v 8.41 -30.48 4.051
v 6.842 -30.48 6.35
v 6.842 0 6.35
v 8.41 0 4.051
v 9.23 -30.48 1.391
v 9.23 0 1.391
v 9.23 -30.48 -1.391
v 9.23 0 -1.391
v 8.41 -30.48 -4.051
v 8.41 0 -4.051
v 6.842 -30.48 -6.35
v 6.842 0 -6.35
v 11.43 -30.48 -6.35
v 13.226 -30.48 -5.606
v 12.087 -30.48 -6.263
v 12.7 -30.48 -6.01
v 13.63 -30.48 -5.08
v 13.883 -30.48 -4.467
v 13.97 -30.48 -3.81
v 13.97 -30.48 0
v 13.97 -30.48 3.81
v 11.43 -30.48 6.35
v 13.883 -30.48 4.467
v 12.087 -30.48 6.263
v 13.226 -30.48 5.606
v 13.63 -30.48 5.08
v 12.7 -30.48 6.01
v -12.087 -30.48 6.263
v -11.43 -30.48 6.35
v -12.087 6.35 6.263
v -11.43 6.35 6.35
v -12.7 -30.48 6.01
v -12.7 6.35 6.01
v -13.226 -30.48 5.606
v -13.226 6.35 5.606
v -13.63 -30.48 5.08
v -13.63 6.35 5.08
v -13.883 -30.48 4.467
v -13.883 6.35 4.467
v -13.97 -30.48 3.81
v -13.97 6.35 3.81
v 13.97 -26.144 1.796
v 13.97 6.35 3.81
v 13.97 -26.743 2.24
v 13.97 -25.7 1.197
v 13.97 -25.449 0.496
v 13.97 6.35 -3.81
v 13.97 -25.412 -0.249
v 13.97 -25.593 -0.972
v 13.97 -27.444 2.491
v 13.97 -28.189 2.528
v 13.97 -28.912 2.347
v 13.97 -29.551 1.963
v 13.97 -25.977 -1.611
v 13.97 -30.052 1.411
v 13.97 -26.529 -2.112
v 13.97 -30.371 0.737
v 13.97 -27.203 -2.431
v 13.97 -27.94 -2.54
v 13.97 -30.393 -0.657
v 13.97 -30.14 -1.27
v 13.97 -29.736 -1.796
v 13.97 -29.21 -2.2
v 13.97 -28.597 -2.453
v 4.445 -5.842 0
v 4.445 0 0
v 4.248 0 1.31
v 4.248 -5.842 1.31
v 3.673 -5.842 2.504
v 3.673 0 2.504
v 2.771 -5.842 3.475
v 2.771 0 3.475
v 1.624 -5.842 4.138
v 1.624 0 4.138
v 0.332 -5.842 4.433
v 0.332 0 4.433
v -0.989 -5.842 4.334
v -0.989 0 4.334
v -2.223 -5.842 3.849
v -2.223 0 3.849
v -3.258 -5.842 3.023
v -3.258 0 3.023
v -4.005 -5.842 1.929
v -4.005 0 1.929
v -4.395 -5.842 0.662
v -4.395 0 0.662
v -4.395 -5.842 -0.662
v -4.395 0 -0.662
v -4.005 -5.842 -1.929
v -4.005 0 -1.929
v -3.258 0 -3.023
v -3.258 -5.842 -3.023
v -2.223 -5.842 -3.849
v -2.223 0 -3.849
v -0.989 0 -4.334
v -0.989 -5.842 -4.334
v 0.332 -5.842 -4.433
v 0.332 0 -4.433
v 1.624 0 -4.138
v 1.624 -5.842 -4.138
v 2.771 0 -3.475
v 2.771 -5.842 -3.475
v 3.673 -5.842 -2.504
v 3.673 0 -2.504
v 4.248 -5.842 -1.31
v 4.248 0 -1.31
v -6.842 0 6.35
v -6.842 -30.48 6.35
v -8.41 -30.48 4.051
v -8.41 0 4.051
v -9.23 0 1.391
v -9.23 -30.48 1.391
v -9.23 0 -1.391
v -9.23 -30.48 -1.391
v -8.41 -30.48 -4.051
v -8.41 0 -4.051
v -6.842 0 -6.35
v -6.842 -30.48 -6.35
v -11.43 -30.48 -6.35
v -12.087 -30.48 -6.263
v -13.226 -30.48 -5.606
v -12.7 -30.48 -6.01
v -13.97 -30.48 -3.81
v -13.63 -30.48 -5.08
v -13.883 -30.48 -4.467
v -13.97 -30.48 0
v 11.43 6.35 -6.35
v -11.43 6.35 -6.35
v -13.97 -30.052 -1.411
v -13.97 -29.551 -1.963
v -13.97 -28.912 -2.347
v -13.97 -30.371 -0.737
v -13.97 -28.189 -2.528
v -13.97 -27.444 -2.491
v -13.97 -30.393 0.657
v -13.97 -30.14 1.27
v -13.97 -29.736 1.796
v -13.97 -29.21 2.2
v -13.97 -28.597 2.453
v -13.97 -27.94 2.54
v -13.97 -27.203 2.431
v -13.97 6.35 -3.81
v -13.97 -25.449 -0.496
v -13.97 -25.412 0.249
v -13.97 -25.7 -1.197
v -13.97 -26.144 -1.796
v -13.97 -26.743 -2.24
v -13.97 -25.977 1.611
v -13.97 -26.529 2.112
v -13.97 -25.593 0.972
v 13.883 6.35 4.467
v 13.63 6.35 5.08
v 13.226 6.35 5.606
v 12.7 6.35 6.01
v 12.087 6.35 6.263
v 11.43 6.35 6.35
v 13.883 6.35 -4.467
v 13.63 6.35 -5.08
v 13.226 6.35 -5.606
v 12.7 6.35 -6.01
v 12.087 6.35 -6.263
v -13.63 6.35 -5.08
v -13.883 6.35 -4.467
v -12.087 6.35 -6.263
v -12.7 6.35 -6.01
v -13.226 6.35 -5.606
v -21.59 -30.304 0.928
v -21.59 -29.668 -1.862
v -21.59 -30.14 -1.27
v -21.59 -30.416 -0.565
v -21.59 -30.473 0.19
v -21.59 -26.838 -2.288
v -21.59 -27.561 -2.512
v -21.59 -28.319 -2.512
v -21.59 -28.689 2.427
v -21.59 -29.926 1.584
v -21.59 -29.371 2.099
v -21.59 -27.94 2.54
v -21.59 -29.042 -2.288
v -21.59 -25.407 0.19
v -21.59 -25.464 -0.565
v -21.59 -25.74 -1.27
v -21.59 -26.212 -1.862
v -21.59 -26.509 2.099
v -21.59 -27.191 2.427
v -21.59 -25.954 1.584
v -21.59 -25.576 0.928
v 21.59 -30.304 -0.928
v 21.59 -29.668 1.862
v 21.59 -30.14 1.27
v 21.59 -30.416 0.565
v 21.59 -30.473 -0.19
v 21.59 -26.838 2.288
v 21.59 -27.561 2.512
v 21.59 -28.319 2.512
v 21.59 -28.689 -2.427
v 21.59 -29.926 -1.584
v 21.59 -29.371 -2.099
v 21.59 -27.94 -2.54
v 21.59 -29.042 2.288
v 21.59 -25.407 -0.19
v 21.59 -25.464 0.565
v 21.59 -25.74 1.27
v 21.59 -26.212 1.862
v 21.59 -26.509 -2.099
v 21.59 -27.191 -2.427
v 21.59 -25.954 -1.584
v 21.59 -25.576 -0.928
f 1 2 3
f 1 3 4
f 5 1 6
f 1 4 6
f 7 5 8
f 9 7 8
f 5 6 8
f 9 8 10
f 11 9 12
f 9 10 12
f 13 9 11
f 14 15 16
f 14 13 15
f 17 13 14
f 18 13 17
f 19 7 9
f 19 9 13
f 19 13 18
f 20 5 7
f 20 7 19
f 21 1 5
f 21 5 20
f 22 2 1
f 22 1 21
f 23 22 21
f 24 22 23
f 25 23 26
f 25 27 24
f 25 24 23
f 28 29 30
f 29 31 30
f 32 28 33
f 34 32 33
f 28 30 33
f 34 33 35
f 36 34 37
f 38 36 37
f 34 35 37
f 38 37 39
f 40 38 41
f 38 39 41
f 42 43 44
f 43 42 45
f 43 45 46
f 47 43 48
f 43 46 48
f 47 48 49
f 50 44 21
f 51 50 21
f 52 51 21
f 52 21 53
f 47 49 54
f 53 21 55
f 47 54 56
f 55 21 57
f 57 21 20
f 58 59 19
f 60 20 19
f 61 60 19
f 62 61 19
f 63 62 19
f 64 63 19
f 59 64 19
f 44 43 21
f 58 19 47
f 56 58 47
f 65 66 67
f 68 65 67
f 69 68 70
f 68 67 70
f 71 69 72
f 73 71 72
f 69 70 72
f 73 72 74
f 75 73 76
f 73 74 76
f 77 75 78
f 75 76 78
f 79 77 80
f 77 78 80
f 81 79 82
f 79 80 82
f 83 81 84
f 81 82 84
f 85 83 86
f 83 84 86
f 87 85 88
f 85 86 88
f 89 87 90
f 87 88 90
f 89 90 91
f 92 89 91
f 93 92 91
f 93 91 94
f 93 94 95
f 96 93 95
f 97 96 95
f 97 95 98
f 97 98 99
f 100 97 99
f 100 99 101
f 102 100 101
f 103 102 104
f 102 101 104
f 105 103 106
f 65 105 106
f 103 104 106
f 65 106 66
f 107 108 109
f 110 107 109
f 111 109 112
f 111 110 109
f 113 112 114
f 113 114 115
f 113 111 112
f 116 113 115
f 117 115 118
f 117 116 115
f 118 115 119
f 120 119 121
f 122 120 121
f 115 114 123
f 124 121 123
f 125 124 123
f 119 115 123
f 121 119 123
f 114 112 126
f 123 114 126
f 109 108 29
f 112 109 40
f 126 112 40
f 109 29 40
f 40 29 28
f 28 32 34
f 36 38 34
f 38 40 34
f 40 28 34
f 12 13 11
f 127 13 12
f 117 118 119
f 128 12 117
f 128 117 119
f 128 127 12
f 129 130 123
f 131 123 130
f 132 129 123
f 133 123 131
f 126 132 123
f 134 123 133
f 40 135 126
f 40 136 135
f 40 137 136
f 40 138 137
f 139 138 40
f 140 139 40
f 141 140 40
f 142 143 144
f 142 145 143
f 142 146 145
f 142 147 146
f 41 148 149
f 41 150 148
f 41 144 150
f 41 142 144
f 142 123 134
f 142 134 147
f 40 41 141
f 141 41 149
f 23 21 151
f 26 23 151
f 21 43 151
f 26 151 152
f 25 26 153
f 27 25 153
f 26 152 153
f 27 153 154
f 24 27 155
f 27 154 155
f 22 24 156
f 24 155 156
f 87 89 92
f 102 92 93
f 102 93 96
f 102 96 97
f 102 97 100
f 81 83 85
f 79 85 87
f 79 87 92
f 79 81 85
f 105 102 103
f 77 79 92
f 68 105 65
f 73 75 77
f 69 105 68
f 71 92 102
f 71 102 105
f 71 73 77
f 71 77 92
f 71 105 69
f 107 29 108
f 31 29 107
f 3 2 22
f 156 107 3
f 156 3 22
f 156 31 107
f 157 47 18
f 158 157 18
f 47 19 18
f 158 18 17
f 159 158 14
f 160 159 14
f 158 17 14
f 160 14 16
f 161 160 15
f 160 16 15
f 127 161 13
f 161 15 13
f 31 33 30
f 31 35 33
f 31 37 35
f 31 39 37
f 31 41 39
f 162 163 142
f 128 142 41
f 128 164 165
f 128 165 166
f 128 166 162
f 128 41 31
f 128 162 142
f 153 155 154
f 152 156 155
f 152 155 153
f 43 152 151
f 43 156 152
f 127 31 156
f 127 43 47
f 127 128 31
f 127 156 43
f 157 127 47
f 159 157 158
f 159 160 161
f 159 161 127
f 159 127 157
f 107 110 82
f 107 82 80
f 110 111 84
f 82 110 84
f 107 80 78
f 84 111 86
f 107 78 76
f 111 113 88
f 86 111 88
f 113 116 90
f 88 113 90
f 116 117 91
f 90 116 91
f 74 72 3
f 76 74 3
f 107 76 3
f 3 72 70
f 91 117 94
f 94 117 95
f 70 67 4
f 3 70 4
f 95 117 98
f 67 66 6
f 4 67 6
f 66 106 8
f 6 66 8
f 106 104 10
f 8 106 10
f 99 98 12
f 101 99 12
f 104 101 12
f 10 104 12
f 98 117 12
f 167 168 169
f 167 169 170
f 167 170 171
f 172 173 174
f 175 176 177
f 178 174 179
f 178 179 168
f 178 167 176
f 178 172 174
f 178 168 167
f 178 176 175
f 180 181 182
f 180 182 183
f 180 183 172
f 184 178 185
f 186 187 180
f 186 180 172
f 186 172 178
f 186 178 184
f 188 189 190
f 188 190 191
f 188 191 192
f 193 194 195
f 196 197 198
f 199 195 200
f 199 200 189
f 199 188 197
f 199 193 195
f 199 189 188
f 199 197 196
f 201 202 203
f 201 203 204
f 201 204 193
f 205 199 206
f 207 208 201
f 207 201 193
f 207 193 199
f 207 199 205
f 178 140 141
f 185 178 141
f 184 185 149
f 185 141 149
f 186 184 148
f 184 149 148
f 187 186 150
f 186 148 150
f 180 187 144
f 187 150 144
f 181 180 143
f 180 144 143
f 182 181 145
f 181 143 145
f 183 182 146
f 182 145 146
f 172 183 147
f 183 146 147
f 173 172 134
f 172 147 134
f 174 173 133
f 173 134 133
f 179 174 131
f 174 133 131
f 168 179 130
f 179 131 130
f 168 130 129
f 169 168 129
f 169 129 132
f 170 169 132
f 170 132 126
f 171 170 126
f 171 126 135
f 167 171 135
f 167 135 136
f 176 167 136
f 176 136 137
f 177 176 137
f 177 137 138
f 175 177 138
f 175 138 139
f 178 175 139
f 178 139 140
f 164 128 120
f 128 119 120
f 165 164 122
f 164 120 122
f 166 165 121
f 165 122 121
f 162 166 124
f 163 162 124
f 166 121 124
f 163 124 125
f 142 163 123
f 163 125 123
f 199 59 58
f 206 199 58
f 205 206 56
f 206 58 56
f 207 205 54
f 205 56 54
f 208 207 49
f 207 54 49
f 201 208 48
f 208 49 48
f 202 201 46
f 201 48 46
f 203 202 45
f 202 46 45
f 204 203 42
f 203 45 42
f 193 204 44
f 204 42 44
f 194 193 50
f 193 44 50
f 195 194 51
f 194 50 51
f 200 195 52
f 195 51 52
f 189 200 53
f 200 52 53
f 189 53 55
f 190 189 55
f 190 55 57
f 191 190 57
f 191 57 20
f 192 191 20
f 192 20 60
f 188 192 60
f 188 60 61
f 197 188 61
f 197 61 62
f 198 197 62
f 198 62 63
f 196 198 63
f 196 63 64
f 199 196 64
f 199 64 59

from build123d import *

# Parameters (mm, degrees)
SKETCH1_W           = 27.94
SKETCH1_H           = 12.7
BOSS_EXTRUDE1_DEPTH = 6.35
SKETCH2_R           = 4.445
BOSS_EXTRUDE2_DEPTH = 5.842
BOSS_EXTRUDE3_DEPTH = 30.48
SKETCH4_R           = 2.54
BOSS_EXTRUDE4_DEPTH = 7.62
SKETCH5_R           = 2.54
BOSS_EXTRUDE5_DEPTH = 7.62
FILLET1_R           = 2.54


with BuildPart() as part:
    # Sketch1 → Boss-Extrude1 (new body)
    with BuildSketch(Plane(origin=(0, 0, 0), x_dir=(1, 0, 0), z_dir=(0, 1, 0))):
        Rectangle(SKETCH1_W, SKETCH1_H)
    extrude(amount=BOSS_EXTRUDE1_DEPTH)

    # Sketch2 → Boss-Extrude2 (add)
    with BuildSketch(Plane.XZ):
        Circle(SKETCH2_R)
    extrude(amount=BOSS_EXTRUDE2_DEPTH)

    # Sketch3 → Boss-Extrude3 (add)
    with BuildSketch(Plane.XZ):
        with BuildLine():
            Line((-13.97, -6.35), (-13.97, 6.35))
            Line((-13.97, 6.35), (-6.841811913, 6.35))
            ThreePointArc((-6.841811913, 6.35), (-9.3345, 0), (-6.841811913, -6.35))
            Line((-6.841811913, -6.35), (-13.97, -6.35))
        make_face()
        with BuildLine():
            Line((6.841811913, -6.35), (13.97, -6.35))
            Line((13.97, -6.35), (13.97, 6.35))
            Line((13.97, 6.35), (6.841811913, 6.35))
            ThreePointArc((6.841811913, 6.35), (9.3345, 0), (6.841811913, -6.35))
        make_face()
    extrude(amount=BOSS_EXTRUDE3_DEPTH)

    # Sketch4 → Boss-Extrude4 (add)
    with BuildSketch(Plane.ZY.offset(13.97)):
        with Locations((0, -27.94)):
            Circle(SKETCH4_R)
    extrude(amount=BOSS_EXTRUDE4_DEPTH)

    # Sketch5 → Boss-Extrude5 (add)
    with BuildSketch(Plane(origin=(13.97, 0, 0), x_dir=(0, 0, -1), z_dir=(1, 0, 0))):
        with Locations((0, -27.94)):
            Circle(SKETCH5_R)
    extrude(amount=BOSS_EXTRUDE5_DEPTH)

    # Fillet1
    fillet1_edges = [part.edges().sort_by_distance(p)[0] for p in [
        (-13.97, -12.065, -6.35),
        (13.97, -12.065, -6.35),
        (13.97, -12.065, 6.35),
        (-13.97, -12.065, 6.35),
    ]]
    fillet(fillet1_edges, radius=FILLET1_R)


solid = part.part
